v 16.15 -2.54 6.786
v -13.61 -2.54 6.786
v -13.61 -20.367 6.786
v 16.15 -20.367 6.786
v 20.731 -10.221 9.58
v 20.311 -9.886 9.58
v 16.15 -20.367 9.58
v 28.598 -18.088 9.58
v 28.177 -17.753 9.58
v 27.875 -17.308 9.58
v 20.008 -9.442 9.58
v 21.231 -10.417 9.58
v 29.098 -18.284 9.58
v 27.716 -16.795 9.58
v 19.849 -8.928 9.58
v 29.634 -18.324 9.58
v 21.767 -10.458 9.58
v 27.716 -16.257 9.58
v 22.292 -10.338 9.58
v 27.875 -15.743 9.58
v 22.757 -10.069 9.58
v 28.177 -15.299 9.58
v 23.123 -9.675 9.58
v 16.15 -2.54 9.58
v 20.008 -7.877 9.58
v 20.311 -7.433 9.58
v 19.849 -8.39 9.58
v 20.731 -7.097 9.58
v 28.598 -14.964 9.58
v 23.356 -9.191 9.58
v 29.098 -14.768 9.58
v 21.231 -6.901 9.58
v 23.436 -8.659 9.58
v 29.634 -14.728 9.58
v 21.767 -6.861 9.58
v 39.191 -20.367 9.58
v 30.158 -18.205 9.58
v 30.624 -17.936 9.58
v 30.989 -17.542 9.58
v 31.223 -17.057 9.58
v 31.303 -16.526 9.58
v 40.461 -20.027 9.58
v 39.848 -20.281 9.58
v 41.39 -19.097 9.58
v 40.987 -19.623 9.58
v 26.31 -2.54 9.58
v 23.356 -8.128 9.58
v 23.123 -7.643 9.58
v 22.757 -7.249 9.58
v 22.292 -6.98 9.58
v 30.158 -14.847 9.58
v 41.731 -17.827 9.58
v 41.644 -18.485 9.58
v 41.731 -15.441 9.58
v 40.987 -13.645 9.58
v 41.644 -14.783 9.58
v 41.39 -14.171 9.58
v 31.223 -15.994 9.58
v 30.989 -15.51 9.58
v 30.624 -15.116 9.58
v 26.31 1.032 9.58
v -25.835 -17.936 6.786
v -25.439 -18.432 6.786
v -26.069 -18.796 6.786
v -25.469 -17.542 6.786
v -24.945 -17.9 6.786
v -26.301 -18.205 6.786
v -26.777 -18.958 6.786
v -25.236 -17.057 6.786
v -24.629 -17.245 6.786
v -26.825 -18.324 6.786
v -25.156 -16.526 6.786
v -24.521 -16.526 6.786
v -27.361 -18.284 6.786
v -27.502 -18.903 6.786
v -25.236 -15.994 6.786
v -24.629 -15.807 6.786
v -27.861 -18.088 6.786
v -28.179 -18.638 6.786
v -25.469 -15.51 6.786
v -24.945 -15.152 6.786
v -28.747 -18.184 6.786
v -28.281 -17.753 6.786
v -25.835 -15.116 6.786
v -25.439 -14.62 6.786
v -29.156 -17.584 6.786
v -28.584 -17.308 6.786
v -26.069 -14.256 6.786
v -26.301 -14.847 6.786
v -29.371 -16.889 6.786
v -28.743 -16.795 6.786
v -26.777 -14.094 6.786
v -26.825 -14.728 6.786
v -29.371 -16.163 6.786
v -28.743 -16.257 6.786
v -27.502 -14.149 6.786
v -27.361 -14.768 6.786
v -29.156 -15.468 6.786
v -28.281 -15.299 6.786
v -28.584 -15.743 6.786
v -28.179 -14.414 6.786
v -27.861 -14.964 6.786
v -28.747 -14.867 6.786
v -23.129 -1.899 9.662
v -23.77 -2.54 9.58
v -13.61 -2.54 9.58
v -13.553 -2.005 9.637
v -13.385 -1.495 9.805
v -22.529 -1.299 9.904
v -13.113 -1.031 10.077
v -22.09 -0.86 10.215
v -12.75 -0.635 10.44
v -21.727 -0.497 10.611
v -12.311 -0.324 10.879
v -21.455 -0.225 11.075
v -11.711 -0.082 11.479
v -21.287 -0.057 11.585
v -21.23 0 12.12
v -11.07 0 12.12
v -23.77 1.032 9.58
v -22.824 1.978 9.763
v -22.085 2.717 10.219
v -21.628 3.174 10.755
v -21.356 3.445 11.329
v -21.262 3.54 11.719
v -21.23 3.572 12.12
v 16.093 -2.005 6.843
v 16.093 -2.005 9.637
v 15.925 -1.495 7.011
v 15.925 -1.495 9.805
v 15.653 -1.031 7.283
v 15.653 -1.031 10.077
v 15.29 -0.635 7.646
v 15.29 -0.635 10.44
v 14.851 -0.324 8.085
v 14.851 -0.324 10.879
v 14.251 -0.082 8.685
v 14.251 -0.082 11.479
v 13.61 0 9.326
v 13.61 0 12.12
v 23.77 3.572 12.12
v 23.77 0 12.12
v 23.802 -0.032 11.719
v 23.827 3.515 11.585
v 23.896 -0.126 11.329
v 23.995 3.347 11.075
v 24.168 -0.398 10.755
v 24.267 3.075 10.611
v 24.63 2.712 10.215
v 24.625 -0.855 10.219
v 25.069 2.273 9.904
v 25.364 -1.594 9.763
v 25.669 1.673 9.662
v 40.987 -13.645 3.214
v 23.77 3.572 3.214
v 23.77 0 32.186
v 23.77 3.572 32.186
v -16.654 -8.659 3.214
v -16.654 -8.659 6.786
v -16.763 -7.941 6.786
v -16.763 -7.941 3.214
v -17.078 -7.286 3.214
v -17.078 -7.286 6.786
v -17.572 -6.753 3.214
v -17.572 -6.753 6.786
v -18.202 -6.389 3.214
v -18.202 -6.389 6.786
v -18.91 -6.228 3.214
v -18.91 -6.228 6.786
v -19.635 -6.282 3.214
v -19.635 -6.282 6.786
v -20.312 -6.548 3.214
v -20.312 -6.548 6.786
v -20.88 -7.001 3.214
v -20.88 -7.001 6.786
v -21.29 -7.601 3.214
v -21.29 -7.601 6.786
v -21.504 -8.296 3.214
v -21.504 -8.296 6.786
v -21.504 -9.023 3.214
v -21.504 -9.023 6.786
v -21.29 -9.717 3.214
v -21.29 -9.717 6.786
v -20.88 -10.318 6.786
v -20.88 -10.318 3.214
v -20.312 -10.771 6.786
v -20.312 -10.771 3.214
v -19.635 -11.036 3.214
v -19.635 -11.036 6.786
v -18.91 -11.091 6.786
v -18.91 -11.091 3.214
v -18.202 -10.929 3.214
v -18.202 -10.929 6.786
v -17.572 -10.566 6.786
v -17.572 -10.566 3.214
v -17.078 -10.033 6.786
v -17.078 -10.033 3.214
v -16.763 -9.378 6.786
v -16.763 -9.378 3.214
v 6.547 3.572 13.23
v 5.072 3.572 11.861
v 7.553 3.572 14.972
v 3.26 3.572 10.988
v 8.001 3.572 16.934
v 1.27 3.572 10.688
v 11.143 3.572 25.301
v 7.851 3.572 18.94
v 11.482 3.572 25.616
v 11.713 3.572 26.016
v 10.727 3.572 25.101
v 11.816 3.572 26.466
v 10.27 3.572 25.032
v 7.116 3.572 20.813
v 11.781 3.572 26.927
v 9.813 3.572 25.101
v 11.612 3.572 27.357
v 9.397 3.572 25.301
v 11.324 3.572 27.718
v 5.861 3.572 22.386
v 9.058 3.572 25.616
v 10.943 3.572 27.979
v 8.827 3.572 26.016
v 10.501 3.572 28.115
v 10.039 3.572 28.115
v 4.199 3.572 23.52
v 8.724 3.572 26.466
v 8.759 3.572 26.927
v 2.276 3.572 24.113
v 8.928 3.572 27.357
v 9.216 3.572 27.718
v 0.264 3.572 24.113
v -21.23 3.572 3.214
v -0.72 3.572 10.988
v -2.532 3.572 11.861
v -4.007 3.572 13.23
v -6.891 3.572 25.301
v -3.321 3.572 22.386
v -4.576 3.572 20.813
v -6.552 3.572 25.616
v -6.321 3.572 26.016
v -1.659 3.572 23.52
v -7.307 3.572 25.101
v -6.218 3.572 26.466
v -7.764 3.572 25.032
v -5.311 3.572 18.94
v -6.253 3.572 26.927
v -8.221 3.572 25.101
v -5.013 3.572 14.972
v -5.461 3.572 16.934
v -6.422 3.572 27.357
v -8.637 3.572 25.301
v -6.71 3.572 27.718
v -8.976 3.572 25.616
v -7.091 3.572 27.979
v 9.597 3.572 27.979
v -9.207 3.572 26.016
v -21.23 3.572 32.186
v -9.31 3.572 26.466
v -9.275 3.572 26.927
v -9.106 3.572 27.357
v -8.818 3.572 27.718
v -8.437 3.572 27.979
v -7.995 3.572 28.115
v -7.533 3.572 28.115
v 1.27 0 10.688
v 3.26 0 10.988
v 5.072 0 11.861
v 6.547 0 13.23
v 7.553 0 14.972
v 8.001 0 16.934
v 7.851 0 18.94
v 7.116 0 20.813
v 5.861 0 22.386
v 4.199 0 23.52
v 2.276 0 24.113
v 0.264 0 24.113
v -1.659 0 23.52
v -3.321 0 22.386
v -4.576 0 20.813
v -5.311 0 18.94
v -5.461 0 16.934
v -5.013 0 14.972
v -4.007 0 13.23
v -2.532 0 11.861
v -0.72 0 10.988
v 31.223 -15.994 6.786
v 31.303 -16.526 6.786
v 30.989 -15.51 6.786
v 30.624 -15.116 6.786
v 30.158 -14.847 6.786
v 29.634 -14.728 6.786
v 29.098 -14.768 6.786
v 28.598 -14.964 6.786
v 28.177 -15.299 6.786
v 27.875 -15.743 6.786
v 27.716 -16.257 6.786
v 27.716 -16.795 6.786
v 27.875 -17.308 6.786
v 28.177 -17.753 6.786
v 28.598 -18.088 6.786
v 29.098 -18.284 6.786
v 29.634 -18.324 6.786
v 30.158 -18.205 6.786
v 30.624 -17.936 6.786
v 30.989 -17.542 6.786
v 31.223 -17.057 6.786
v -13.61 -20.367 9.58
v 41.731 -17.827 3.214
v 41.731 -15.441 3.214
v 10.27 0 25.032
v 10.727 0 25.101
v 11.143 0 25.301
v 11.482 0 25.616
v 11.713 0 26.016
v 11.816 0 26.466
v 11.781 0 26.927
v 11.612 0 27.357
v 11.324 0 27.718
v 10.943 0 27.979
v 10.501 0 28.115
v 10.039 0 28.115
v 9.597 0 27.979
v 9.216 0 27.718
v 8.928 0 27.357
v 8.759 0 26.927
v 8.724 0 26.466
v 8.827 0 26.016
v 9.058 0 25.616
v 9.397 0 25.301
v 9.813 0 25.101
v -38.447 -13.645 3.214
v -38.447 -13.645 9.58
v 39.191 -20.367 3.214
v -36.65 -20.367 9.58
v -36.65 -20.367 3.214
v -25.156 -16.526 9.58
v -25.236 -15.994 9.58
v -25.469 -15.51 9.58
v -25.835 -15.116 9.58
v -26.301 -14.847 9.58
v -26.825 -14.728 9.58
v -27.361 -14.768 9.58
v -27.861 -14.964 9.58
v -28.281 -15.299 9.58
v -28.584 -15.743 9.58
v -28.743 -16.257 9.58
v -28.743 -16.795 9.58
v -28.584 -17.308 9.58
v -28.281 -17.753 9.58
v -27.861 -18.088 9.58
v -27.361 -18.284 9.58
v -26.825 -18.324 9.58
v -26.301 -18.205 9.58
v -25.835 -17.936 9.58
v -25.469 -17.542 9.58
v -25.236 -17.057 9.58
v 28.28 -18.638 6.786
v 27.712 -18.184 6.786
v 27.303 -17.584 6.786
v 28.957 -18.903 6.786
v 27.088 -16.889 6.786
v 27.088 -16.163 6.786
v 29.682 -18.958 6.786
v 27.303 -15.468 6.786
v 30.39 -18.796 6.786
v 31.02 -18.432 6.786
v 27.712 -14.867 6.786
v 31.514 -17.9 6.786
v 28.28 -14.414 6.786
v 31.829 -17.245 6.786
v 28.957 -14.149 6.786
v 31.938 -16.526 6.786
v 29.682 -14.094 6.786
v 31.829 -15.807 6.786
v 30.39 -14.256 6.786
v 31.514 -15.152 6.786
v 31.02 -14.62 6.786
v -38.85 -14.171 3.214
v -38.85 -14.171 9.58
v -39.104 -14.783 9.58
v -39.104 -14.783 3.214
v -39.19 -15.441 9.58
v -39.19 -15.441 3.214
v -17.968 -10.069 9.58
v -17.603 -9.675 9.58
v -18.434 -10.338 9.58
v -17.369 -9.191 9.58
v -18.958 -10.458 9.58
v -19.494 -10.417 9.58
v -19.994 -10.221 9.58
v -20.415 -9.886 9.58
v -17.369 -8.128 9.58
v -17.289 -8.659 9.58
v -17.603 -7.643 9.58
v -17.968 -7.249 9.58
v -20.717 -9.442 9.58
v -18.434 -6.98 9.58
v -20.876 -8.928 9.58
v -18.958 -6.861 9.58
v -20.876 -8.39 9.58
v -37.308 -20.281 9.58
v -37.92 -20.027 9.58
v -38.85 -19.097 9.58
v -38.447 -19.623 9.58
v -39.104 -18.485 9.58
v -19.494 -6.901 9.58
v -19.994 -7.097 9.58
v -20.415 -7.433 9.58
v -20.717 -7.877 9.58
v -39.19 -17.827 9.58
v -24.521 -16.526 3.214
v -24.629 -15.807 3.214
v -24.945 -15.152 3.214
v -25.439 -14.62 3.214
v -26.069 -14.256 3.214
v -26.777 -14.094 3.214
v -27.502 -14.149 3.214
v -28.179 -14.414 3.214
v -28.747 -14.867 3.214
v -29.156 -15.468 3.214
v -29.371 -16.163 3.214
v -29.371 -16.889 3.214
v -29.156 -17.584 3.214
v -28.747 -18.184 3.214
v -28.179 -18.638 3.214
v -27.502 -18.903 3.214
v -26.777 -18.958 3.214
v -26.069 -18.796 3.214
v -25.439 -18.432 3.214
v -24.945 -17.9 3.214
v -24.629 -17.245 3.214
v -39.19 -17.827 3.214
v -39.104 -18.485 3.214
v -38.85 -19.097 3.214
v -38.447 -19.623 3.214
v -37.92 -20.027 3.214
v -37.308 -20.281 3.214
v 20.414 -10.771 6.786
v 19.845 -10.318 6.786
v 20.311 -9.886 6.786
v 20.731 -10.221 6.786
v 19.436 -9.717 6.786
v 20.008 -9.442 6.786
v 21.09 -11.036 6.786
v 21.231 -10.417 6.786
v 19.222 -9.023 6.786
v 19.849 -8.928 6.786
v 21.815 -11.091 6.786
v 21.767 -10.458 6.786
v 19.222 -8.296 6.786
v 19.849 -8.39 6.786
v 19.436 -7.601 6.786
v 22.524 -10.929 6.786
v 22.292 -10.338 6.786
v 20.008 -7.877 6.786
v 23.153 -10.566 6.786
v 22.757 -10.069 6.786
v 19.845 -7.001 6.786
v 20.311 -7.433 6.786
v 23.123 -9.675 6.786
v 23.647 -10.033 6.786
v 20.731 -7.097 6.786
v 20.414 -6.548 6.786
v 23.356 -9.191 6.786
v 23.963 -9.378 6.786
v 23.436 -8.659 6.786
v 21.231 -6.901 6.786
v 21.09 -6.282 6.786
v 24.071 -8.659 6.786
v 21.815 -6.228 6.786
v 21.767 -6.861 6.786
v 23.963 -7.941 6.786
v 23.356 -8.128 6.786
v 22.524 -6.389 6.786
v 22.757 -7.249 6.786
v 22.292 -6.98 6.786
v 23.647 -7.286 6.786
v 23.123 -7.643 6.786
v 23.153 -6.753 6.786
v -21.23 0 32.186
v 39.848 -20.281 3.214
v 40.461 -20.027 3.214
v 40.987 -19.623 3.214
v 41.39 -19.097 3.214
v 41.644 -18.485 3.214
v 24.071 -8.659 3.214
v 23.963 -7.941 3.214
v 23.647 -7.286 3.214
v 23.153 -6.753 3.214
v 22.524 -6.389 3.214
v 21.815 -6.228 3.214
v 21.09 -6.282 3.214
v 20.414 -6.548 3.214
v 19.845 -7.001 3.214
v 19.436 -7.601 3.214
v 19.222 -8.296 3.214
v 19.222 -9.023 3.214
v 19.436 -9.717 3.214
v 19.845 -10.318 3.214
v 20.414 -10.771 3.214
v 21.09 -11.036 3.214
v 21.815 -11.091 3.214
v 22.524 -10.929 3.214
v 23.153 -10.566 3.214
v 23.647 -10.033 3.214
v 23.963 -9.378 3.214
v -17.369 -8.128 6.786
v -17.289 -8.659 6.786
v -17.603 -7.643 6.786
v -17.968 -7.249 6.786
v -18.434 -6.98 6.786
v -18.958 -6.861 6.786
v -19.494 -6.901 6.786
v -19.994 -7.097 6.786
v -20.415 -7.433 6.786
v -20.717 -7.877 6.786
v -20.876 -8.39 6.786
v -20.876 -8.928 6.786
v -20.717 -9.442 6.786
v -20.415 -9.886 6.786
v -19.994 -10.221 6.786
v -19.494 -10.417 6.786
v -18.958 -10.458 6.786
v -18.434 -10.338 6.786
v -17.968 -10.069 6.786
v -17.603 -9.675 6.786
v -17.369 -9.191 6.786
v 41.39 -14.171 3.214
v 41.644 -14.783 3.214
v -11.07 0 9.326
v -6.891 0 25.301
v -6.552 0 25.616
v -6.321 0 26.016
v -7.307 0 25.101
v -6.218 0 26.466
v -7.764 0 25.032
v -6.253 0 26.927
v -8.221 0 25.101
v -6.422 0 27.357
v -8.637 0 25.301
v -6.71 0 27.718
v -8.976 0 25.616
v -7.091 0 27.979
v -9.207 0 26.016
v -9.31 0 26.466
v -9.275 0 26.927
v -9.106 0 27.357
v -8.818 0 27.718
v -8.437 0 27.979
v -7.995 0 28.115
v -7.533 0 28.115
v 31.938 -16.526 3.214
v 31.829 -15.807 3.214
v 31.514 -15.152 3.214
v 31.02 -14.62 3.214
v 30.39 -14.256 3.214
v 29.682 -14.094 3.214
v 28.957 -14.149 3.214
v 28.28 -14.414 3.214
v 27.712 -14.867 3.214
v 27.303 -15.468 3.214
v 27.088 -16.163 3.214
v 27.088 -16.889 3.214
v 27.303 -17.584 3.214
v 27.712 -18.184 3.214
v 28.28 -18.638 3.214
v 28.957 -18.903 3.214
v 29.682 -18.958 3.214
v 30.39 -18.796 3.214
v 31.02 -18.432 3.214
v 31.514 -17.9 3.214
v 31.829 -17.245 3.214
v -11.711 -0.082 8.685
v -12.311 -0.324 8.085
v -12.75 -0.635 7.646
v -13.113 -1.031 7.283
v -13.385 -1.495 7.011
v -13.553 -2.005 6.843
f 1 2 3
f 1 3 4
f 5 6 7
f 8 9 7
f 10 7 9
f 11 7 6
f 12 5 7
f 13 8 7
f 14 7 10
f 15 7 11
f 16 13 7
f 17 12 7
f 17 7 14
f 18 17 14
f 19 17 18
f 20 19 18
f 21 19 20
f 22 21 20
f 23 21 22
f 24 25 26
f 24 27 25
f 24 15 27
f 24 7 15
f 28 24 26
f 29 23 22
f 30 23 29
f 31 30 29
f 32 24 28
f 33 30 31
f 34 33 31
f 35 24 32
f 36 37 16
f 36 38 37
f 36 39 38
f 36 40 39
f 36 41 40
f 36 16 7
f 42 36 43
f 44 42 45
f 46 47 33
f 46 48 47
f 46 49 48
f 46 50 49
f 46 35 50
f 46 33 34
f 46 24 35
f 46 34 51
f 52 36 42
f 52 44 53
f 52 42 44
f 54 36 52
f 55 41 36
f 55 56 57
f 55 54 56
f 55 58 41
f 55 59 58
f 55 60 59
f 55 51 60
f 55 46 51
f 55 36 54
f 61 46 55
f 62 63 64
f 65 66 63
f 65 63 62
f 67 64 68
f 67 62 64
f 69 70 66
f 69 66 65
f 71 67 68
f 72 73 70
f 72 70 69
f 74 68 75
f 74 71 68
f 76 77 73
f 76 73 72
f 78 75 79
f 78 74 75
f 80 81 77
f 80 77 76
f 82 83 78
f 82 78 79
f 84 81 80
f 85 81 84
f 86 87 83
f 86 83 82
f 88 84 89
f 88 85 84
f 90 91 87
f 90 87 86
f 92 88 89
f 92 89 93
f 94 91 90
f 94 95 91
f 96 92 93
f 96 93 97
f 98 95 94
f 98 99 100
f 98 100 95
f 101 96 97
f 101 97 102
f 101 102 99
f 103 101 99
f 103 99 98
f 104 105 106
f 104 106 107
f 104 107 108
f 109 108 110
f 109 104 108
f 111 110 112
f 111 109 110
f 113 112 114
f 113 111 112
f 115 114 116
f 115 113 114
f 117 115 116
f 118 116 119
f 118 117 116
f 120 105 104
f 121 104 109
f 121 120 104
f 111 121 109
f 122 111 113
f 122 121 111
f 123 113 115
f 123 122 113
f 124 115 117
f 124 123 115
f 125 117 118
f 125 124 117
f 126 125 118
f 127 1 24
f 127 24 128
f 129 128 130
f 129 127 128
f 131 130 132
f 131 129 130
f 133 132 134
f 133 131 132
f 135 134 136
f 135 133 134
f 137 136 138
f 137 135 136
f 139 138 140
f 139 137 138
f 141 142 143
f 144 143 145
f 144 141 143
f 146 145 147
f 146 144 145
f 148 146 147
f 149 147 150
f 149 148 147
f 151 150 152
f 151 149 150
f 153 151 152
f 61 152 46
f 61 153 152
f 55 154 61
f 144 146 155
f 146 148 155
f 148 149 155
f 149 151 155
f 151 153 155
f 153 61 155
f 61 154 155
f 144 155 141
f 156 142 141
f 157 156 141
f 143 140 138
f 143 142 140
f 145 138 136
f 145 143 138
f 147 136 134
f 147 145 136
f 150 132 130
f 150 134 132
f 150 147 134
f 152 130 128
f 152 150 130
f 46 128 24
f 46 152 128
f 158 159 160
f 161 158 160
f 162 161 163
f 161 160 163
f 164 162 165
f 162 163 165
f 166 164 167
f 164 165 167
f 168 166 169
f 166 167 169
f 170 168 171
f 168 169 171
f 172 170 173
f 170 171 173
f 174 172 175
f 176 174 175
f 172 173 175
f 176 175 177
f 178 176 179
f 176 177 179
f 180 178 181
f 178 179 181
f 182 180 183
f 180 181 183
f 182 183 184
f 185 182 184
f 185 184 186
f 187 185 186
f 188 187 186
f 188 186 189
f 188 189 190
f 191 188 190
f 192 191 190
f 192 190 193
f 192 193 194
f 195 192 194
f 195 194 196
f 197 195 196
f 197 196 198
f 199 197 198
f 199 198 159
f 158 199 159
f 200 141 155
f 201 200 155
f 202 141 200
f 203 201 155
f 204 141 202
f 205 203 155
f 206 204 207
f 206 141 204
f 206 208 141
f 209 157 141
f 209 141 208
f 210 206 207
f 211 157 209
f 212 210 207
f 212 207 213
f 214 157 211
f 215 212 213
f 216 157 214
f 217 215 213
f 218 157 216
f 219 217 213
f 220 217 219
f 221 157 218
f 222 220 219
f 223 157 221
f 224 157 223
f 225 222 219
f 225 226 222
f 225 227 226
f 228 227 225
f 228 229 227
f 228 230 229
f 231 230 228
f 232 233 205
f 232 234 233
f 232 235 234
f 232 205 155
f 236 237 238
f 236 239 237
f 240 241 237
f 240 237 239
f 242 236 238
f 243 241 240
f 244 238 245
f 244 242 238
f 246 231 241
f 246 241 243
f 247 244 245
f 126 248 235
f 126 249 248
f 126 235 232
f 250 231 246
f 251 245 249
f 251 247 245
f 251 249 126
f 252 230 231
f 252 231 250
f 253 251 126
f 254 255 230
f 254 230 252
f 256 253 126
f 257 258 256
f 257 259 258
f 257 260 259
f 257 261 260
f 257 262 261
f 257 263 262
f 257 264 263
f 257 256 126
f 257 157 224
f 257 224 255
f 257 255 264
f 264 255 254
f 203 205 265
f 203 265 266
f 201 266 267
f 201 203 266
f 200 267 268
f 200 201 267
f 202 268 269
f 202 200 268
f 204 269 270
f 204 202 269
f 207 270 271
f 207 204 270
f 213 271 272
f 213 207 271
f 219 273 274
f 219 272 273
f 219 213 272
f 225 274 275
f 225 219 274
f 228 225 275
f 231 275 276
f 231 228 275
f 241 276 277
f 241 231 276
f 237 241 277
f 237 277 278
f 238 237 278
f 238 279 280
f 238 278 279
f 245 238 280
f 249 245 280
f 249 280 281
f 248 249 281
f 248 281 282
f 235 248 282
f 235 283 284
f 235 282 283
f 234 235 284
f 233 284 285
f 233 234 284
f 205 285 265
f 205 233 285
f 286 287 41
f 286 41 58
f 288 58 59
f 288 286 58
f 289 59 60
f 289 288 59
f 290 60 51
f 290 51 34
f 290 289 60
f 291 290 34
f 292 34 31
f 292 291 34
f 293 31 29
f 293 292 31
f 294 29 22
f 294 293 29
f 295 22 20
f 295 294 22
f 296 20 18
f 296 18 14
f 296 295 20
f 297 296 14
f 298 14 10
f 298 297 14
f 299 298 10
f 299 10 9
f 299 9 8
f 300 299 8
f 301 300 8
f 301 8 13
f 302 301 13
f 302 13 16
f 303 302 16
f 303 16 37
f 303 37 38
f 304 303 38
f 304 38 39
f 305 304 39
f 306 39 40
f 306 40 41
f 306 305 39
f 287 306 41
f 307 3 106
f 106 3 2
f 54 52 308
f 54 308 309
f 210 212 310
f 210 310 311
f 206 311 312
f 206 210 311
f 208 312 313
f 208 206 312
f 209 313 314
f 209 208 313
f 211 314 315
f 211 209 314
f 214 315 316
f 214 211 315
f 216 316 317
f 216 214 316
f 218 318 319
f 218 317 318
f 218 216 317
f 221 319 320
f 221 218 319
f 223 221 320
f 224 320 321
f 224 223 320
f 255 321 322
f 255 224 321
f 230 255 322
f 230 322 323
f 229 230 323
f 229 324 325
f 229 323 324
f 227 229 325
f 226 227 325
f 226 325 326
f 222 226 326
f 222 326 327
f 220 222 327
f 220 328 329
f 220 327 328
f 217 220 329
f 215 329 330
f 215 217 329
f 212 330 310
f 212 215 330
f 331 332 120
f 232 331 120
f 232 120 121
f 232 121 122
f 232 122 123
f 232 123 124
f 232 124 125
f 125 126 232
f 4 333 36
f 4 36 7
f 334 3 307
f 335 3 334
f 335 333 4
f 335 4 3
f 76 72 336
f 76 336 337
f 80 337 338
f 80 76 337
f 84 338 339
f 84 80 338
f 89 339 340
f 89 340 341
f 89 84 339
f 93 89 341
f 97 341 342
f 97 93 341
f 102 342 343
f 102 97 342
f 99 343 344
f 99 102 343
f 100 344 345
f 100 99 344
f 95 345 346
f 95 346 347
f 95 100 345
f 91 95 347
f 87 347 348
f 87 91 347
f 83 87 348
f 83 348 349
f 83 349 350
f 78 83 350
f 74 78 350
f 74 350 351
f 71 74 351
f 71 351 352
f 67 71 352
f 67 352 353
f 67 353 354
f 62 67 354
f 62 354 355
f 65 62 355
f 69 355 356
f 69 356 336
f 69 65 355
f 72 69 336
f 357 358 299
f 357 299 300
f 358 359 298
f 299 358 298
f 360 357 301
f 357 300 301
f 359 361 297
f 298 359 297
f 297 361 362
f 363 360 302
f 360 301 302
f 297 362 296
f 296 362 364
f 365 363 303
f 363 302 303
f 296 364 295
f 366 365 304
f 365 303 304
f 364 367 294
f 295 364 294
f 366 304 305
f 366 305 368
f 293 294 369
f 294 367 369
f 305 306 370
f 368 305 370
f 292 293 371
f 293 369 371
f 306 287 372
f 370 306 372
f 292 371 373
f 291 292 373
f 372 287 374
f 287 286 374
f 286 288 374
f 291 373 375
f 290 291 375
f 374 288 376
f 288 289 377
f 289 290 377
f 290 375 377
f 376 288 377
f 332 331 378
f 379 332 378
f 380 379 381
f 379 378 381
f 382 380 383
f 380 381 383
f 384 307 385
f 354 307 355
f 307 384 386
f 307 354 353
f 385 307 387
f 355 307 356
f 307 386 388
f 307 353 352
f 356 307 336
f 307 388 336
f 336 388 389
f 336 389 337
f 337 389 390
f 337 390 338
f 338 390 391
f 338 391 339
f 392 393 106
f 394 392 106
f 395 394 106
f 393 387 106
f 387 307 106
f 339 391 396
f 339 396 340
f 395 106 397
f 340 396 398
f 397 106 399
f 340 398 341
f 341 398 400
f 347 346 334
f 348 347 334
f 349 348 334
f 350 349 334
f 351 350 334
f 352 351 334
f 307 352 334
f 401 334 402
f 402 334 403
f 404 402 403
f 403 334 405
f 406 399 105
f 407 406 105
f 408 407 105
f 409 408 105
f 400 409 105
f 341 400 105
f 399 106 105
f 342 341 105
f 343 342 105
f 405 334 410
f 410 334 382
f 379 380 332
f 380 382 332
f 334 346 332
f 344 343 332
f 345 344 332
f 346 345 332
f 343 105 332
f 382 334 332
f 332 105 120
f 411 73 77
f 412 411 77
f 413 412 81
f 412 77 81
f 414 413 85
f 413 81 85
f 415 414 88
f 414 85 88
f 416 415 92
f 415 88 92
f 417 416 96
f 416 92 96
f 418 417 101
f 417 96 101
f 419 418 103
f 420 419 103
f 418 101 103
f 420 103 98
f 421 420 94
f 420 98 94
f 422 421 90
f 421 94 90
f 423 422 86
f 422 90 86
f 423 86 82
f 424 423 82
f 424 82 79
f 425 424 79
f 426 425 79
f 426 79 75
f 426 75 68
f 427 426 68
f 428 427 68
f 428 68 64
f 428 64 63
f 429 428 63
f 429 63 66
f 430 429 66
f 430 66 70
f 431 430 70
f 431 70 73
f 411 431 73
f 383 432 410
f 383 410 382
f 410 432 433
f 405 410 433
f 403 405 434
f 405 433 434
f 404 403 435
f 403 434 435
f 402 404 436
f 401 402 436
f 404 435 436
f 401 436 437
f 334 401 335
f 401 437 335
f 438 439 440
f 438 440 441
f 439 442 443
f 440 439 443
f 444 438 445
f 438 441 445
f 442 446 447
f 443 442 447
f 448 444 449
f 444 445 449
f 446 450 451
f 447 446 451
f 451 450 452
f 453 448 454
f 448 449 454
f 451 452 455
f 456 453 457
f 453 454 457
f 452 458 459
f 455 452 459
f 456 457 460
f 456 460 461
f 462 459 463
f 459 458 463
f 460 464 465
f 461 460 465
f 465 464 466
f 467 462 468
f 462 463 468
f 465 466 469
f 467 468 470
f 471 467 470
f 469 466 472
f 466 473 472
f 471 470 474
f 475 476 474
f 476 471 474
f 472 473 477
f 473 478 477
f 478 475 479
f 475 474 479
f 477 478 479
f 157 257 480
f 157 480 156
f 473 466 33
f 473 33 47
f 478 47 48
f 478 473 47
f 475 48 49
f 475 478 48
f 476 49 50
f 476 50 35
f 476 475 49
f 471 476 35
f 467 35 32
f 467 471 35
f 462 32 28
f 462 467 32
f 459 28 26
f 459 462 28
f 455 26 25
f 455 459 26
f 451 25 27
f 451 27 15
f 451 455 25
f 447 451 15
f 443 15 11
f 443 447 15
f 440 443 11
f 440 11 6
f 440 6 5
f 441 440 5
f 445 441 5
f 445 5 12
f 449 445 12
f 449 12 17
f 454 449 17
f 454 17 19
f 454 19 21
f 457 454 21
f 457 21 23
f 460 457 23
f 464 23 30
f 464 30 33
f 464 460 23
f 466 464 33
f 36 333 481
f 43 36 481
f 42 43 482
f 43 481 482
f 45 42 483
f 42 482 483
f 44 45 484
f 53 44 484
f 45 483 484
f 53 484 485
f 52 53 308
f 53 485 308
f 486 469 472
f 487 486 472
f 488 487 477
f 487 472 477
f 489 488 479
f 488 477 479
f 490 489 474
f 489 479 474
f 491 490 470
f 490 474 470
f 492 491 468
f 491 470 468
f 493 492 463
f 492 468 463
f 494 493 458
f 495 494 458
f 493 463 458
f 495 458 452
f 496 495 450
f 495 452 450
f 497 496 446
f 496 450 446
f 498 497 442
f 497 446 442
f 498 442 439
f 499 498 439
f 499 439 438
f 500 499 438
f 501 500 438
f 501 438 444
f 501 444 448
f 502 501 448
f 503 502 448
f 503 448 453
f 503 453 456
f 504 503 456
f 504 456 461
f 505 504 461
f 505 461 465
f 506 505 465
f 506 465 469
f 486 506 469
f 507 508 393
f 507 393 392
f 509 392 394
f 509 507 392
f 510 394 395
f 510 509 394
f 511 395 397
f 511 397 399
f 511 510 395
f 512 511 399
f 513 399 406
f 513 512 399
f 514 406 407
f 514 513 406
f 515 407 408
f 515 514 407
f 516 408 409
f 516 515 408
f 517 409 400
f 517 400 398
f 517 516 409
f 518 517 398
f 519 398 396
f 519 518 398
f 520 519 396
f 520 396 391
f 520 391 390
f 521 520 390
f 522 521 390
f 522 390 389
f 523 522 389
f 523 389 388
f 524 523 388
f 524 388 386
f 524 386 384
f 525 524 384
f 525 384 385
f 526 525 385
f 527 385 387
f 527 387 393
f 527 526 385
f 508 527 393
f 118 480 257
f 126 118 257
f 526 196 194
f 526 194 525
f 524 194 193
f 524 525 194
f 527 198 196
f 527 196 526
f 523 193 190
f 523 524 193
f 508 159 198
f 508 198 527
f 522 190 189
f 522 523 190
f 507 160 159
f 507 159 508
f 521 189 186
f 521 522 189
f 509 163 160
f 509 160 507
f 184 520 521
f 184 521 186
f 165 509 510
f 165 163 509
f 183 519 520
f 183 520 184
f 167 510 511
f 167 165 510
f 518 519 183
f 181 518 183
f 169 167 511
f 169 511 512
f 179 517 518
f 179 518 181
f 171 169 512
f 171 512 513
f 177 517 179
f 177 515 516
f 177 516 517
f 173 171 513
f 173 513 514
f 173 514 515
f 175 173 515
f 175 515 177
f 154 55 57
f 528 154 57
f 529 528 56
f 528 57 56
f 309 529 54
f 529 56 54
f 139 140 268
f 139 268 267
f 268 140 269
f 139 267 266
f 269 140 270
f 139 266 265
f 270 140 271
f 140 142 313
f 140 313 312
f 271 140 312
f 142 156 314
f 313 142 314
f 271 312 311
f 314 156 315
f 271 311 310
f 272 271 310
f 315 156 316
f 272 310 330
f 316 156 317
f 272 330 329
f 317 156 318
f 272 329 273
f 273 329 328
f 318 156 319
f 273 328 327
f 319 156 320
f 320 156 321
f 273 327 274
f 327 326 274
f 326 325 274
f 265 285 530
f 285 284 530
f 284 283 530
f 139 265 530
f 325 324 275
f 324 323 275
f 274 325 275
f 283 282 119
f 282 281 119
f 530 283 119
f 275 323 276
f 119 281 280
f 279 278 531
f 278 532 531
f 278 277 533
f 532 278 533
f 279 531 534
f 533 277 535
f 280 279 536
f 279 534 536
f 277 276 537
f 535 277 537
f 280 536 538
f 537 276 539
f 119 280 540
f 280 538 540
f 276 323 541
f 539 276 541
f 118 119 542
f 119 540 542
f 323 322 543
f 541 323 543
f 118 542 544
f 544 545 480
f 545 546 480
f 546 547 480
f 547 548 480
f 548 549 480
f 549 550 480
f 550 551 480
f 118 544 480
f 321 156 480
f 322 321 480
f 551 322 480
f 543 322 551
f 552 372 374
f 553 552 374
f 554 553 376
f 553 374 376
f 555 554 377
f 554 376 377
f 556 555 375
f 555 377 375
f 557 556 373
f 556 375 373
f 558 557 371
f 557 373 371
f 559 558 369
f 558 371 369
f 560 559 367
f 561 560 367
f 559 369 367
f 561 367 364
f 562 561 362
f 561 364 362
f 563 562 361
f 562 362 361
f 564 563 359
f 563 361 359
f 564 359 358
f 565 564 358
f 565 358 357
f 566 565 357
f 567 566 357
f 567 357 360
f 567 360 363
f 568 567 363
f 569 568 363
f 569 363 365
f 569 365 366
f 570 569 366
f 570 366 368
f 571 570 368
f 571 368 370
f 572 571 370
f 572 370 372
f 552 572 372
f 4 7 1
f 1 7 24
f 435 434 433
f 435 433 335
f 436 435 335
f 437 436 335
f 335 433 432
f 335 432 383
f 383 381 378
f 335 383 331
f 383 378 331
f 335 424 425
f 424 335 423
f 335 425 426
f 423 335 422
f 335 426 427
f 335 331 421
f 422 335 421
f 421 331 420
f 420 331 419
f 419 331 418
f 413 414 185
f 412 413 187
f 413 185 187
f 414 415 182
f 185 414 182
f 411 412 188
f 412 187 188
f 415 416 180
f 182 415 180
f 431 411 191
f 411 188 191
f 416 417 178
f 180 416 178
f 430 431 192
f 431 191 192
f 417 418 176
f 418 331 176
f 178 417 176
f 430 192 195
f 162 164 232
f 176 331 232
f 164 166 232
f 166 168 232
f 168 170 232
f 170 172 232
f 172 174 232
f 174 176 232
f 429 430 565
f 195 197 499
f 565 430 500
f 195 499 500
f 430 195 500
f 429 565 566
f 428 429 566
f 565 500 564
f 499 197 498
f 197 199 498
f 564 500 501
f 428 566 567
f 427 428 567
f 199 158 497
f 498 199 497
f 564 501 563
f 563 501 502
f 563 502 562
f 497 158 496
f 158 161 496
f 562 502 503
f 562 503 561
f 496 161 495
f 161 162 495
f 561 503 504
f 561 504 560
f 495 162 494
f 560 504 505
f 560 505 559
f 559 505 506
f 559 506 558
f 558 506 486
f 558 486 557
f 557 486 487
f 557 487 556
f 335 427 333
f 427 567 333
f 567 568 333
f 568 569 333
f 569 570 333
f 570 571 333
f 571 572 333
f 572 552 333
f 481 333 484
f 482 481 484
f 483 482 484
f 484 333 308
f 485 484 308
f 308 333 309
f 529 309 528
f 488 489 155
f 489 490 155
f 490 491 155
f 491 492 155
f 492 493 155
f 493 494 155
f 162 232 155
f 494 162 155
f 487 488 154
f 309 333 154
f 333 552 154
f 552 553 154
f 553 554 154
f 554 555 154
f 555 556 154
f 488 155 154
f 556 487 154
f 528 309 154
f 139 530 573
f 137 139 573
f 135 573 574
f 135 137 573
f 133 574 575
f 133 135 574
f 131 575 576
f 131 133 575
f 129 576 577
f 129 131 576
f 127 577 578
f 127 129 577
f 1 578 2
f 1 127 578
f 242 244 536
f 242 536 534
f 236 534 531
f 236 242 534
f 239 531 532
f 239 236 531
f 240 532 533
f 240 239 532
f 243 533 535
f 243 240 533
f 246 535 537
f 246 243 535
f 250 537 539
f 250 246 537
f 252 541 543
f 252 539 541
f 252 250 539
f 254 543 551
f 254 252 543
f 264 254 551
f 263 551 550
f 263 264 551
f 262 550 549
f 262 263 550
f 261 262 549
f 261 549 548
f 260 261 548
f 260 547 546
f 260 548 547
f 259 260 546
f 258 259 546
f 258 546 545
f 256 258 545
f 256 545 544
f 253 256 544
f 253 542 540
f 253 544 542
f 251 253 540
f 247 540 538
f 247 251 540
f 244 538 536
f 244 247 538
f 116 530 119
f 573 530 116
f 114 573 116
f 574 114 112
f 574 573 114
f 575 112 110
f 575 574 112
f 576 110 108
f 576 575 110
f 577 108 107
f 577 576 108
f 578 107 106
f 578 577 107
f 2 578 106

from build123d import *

# Parameters (mm, degrees)
BOSS_EXTRUDE1_DEPTH      = 1.7859375
BOSS_EXTRUDE1_DEPTH_BACK = 1.7859375
SKETCH2_W                = 45
SKETCH2_H                = 3.571875
BOSS_EXTRUDE2_DEPTH      = 25.4
FILLET1_R                = 2
SKETCH9_W                = 44.9012818
SKETCH9_H                = 1.417156311
CUT_EXTRUDE1_DEPTH       = 10
BOSS_EXTRUDE3_DEPTH      = 3.571875
SKETCH14_R               = 2.4384
CUT_EXTRUDE4_DEPTH       = 53.928506192
CUT_EXTRUDE5_DEPTH       = 57.499569383
CUT_EXTRUDE5_DEPTH_BACK  = 57.499569383
SKETCH15_R               = 6.75
SKETCH15_R_2             = 1.55
SKETCH19_R               = 1.8034
BOSS_EXTRUDE6_DEPTH      = 2.794
FILLET3_R                = 2.54


with BuildPart() as part:
    # Sketch1 → Boss-Extrude1 (new, two sides: drawn at the far end of the back side and taken through both)
    with BuildSketch(Plane.XY.offset(5).offset(-BOSS_EXTRUDE1_DEPTH_BACK)):
        with BuildLine():
            Line((-21.183407813, 0), (-21.183407813, -8.813455393))
            ThreePointArc((-21.183407813, -8.813455393), (-22.866221682, -12.686440931), (-19.530849883, -15.276262248))
            Line((-19.530849883, -15.276262248), (24.68248716, -15.276262248))
            ThreePointArc((24.68248716, -15.276262248), (25.214329472, -14.744419936), (24.68248716, -14.212577623))
            Line((24.68248716, -14.212577623), (23.717873987, 0))
            Line((23.717873987, 0), (23.717873987, 4.989031311))
            Line((23.717873987, 4.989031311), (-21.183407813, 4.989031311))
            Line((-21.183407813, 4.989031311), (-21.183407813, 0))
        make_face()
    extrude(amount=BOSS_EXTRUDE1_DEPTH + BOSS_EXTRUDE1_DEPTH_BACK)

    # Sketch2 → Boss-Extrude2 (add)
    with BuildSketch(Plane.XY.offset(6.7859375)):
        with Locations((1.270019176, 1.7859375)):
            Rectangle(SKETCH2_W, SKETCH2_H)
    extrude(amount=BOSS_EXTRUDE2_DEPTH)

    # Fillet1
    fillet1_edges = [part.edges().sort_by_distance(p)[0] for p in [
        (1.267233087, 4.989031311, 3.2140625),
    ]]
    fillet(fillet1_edges, radius=FILLET1_R)

    # Sketch9 → Cut-Extrude1 (cut)
    with BuildSketch(Plane.XY.offset(6.7859375)):
        with Locations((1.267233087, 4.280453156)):
            Rectangle(SKETCH9_W, SKETCH9_H)
    extrude(amount=-CUT_EXTRUDE1_DEPTH, mode=Mode.SUBTRACT)

    # Sketch13 → Boss-Extrude3 (add, through all)
    with BuildSketch(Plane.XY.offset(6.7859375)):
        Polygon((-21.229980824, 3.571875), (-39.190493066, -14.388637242), (-39.190493066, -20.367363974), (41.730531418, -20.367363974), (41.730531418, -14.388637242), (23.770019176, 3.571875), align=None)
    extrude(amount=-BOSS_EXTRUDE3_DEPTH)

    # Sketch14 → Cut-Extrude4 (cut, through all)
    with BuildSketch(Plane.XY.offset(6.7859375)):
        with Locations((-26.959384229, -16.525938199)):
            Circle(SKETCH14_R)
        with Locations((-19.092679867, -8.659233837)):
            Circle(SKETCH14_R)
        with Locations((21.632718219, -8.659233837)):
            Circle(SKETCH14_R)
        with Locations((29.499422581, -16.525938199)):
            Circle(SKETCH14_R)
    extrude(amount=-CUT_EXTRUDE4_DEPTH, mode=Mode.SUBTRACT)

    # Sketch15 → Cut-Extrude5 (cut, two sides: drawn at the far end of the back side and taken through both)
    with BuildSketch(Plane.XZ.offset(-CUT_EXTRUDE5_DEPTH_BACK)):
        with Locations(Location((1.270019176, 17.4380625, 0), (0, 0, 270))):
            Circle(SKETCH15_R)
        with Locations(Location((-7.763980824, 26.5820625, 0), (0, 0, 270))):
            Circle(SKETCH15_R_2)
        with Locations(Location((10.270019176, 26.5820625, 0), (0, 0, 270))):
            Circle(SKETCH15_R_2)
    extrude(amount=CUT_EXTRUDE5_DEPTH + CUT_EXTRUDE5_DEPTH_BACK, mode=Mode.SUBTRACT)

    # Sketch19 → Boss-Extrude6 (add)
    # profile 1 of 2: a face of its own
    with BuildSketch(Plane.XY.offset(6.7859375)):
        Polygon((-39.190493066, -14.388637242), (-21.229980824, 3.571875), (-21.229980824, 0), (-13.609980824, 0), (-13.609980824, -20.367363974), (-39.190493066, -20.367363974), align=None)
        with Locations((-19.092679867, -8.659233837)):
            Circle(SKETCH19_R, mode=Mode.SUBTRACT)
        with Locations((-26.959384229, -16.525938199)):
            Circle(SKETCH19_R, mode=Mode.SUBTRACT)
    # profile 2 of 2: a face of its own
    with BuildSketch(Plane.XY.offset(6.7859375)):
        Polygon((41.730531418, -20.367363974), (41.730531418, -14.388637242), (23.770019176, 3.571875), (23.770019176, 0), (16.150019176, 0), (16.150019176, -20.367363974), align=None)
        with Locations((21.632718219, -8.659233837)):
            Circle(SKETCH19_R, mode=Mode.SUBTRACT)
        with Locations((29.499422581, -16.525938199)):
            Circle(SKETCH19_R, mode=Mode.SUBTRACT)
    extrude(amount=BOSS_EXTRUDE6_DEPTH)

    # Fillet3
    # the kernel refuses this fillet: 2.54 mm, written as the material it adds along each edge
    with BuildSketch(Plane(origin=(16.150019176, 0, 6.7859375), x_dir=(0, -1, 0), z_dir=(-1, 0, 0))) as fillet3_piece_1:
        with BuildLine():
            CenterArc((FILLET3_R, FILLET3_R), FILLET3_R, 180, 90)
            Line((0, FILLET3_R), (-FILLET3_R * 0.02, FILLET3_R))
            Line((-FILLET3_R * 0.02, FILLET3_R), (-FILLET3_R * 0.02, -FILLET3_R * 0.02))
            Line((-FILLET3_R * 0.02, -FILLET3_R * 0.02), (FILLET3_R, -FILLET3_R * 0.02))
            Line((FILLET3_R, -FILLET3_R * 0.02), (FILLET3_R, 0))
        make_face()
    extrude(amount=29.76)
    with BuildSketch(Plane(origin=(-21.229980824, 0, 9.5799375), x_dir=(0, -1, 0), z_dir=(1, 0, 0))) as fillet3_piece_2:
        with BuildLine():
            CenterArc((FILLET3_R, -FILLET3_R), FILLET3_R, 90, 90)
            Line((0, -FILLET3_R), (-FILLET3_R * 0.02, -FILLET3_R))
            Line((-FILLET3_R * 0.02, -FILLET3_R), (-FILLET3_R * 0.02, FILLET3_R * 0.02))
            Line((-FILLET3_R * 0.02, FILLET3_R * 0.02), (FILLET3_R, FILLET3_R * 0.02))
            Line((FILLET3_R, FILLET3_R * 0.02), (FILLET3_R, 0))
        make_face()
    extrude(amount=7.62)
    with BuildSketch(Plane(origin=(-21.229980824, 3.571875, 9.5799375), x_dir=(-1, 0, 0), z_dir=(0, -1, 0))) as fillet3_piece_3_section:
        with BuildLine():
            CenterArc((FILLET3_R, -FILLET3_R), FILLET3_R, 90, 90)
            Line((0, -FILLET3_R), (-FILLET3_R * 0.02, -FILLET3_R))
            Line((-FILLET3_R * 0.02, -FILLET3_R), (-FILLET3_R * 0.02, FILLET3_R * 0.02))
            Line((-FILLET3_R * 0.02, FILLET3_R * 0.02), (FILLET3_R, FILLET3_R * 0.02))
            Line((FILLET3_R, FILLET3_R * 0.02), (FILLET3_R, 0))
        make_face()
    fillet3_piece_3 = extrude(amount=3.571875, mode=Mode.PRIVATE)
    fillet3_piece_3 = split(fillet3_piece_3, bisect_by=Plane(origin=(-22.480055671, 2.321800154, 10.2136759), z_dir=(0.7071067811865489, -0.7071067811865461, 0)), keep=Keep.TOP, mode=Mode.PRIVATE)
    add(fillet3_piece_3)
    with BuildSketch(Plane(origin=(-13.609980824, 0, 6.7859375), x_dir=(0, -1, 0), z_dir=(0, 0, 1))) as fillet3_piece_4:
        with BuildLine():
            CenterArc((FILLET3_R, FILLET3_R), FILLET3_R, 180, 90)
            Line((0, FILLET3_R), (-FILLET3_R * 0.02, FILLET3_R))
            Line((-FILLET3_R * 0.02, FILLET3_R), (-FILLET3_R * 0.02, -FILLET3_R * 0.02))
            Line((-FILLET3_R * 0.02, -FILLET3_R * 0.02), (FILLET3_R, -FILLET3_R * 0.02))
            Line((FILLET3_R, -FILLET3_R * 0.02), (FILLET3_R, 0))
        make_face()
    extrude(amount=2.794)
    with BuildSketch(Plane(origin=(23.770019176, 3.571875, 9.5799375), x_dir=(1, 0, 0), z_dir=(0, -1, 0))) as fillet3_piece_5_section:
        with BuildLine():
            CenterArc((FILLET3_R, FILLET3_R), FILLET3_R, 180, 90)
            Line((0, FILLET3_R), (-FILLET3_R * 0.02, FILLET3_R))
            Line((-FILLET3_R * 0.02, FILLET3_R), (-FILLET3_R * 0.02, -FILLET3_R * 0.02))
            Line((-FILLET3_R * 0.02, -FILLET3_R * 0.02), (FILLET3_R, -FILLET3_R * 0.02))
            Line((FILLET3_R, -FILLET3_R * 0.02), (FILLET3_R, 0))
        make_face()
    fillet3_piece_5 = extrude(amount=3.571875, mode=Mode.PRIVATE)
    fillet3_piece_5 = split(fillet3_piece_5, bisect_by=Plane(origin=(25.020094022, 2.321800154, 10.2136759), z_dir=(-0.7071067811865436, -0.7071067811865516, 0)), keep=Keep.TOP, mode=Mode.PRIVATE)
    add(fillet3_piece_5)
    with BuildSketch(Plane(origin=(23.770019176, 0, 9.5799375), x_dir=(0, -1, 0), z_dir=(-1, 0, 0))) as fillet3_piece_6:
        with BuildLine():
            CenterArc((FILLET3_R, FILLET3_R), FILLET3_R, 180, 90)
            Line((0, FILLET3_R), (-FILLET3_R * 0.02, FILLET3_R))
            Line((-FILLET3_R * 0.02, FILLET3_R), (-FILLET3_R * 0.02, -FILLET3_R * 0.02))
            Line((-FILLET3_R * 0.02, -FILLET3_R * 0.02), (FILLET3_R, -FILLET3_R * 0.02))
            Line((FILLET3_R, -FILLET3_R * 0.02), (FILLET3_R, 0))
        make_face()
    extrude(amount=7.62)
    with BuildSketch(Plane(origin=(16.150019176, 0, 6.7859375), x_dir=(0, -1, 0), z_dir=(0, 0, 1))) as fillet3_piece_7:
        with BuildLine():
            CenterArc((FILLET3_R, -FILLET3_R), FILLET3_R, 90, 90)
            Line((0, -FILLET3_R), (-FILLET3_R * 0.02, -FILLET3_R))
            Line((-FILLET3_R * 0.02, -FILLET3_R), (-FILLET3_R * 0.02, FILLET3_R * 0.02))
            Line((-FILLET3_R * 0.02, FILLET3_R * 0.02), (FILLET3_R, FILLET3_R * 0.02))
            Line((FILLET3_R, FILLET3_R * 0.02), (FILLET3_R, 0))
        make_face()
    extrude(amount=2.794)
    with BuildSketch(Plane(origin=(16.150019176, 0, 0.4359375), x_dir=(0, -1, 0), z_dir=(0, 0, 1))) as fillet3_piece_8a_section:
        with BuildLine():
            CenterArc((FILLET3_R, -FILLET3_R), FILLET3_R, 90, 90)
            Line((0, -FILLET3_R), (-FILLET3_R * 0.02, -FILLET3_R))
            Line((-FILLET3_R * 0.02, -FILLET3_R), (-FILLET3_R * 0.02, FILLET3_R * 0.02))
            Line((-FILLET3_R * 0.02, FILLET3_R * 0.02), (FILLET3_R, FILLET3_R * 0.02))
            Line((FILLET3_R, FILLET3_R * 0.02), (FILLET3_R, 0))
        make_face()
    fillet3_piece_8a = extrude(amount=9.144, mode=Mode.PRIVATE)
    fillet3_piece_8a = split(fillet3_piece_8a, bisect_by=Plane(origin=(15.574975586, -0.57504359, 6.7859375), z_dir=(0, 0, -1)), keep=Keep.TOP, mode=Mode.PRIVATE)
    with BuildSketch(Plane(origin=(22.500019176, 0, 6.7859375), x_dir=(0, -1, 0), z_dir=(-1, 0, 0))) as fillet3_piece_8b_section:
        with BuildLine():
            CenterArc((FILLET3_R, FILLET3_R), FILLET3_R, 180, 90)
            Line((0, FILLET3_R), (-FILLET3_R * 0.02, FILLET3_R))
            Line((-FILLET3_R * 0.02, FILLET3_R), (-FILLET3_R * 0.02, -FILLET3_R * 0.02))
            Line((-FILLET3_R * 0.02, -FILLET3_R * 0.02), (FILLET3_R, -FILLET3_R * 0.02))
            Line((FILLET3_R, -FILLET3_R * 0.02), (FILLET3_R, 0))
        make_face()
    fillet3_piece_8b = extrude(amount=36.11, mode=Mode.PRIVATE)
    fillet3_piece_8b = split(fillet3_piece_8b, bisect_by=Plane(origin=(16.150019176, -0.57504359, 7.36098109), z_dir=(1, 0, 0)), keep=Keep.TOP, mode=Mode.PRIVATE)
    fillet3_piece_8 = fillet3_piece_8a & fillet3_piece_8b
    add(fillet3_piece_8)
    with BuildSketch(Plane(origin=(16.150019176, 0, 6.7859375), x_dir=(0, -1, 0), z_dir=(-1, 0, 0))) as fillet3_piece_9a_section:
        with BuildLine():
            CenterArc((FILLET3_R, FILLET3_R), FILLET3_R, 180, 90)
            Line((0, FILLET3_R), (-FILLET3_R * 0.02, FILLET3_R))
            Line((-FILLET3_R * 0.02, FILLET3_R), (-FILLET3_R * 0.02, -FILLET3_R * 0.02))
            Line((-FILLET3_R * 0.02, -FILLET3_R * 0.02), (FILLET3_R, -FILLET3_R * 0.02))
            Line((FILLET3_R, -FILLET3_R * 0.02), (FILLET3_R, 0))
        make_face()
    fillet3_piece_9a = extrude(amount=36.11, mode=Mode.PRIVATE)
    fillet3_piece_9a = split(fillet3_piece_9a, bisect_by=Plane(origin=(-13.609980824, -0.57504359, 7.36098109), z_dir=(-1, 0, 0)), keep=Keep.TOP, mode=Mode.PRIVATE)
    with BuildSketch(Plane(origin=(-13.609980824, 0, 0.4359375), x_dir=(0, -1, 0), z_dir=(0, 0, 1))) as fillet3_piece_9b_section:
        with BuildLine():
            CenterArc((FILLET3_R, FILLET3_R), FILLET3_R, 180, 90)
            Line((0, FILLET3_R), (-FILLET3_R * 0.02, FILLET3_R))
            Line((-FILLET3_R * 0.02, FILLET3_R), (-FILLET3_R * 0.02, -FILLET3_R * 0.02))
            Line((-FILLET3_R * 0.02, -FILLET3_R * 0.02), (FILLET3_R, -FILLET3_R * 0.02))
            Line((FILLET3_R, -FILLET3_R * 0.02), (FILLET3_R, 0))
        make_face()
    fillet3_piece_9b = extrude(amount=9.144, mode=Mode.PRIVATE)
    fillet3_piece_9b = split(fillet3_piece_9b, bisect_by=Plane(origin=(-13.034937234, -0.57504359, 6.7859375), z_dir=(0, 0, -1)), keep=Keep.TOP, mode=Mode.PRIVATE)
    fillet3_piece_9 = fillet3_piece_9a & fillet3_piece_9b
    add(fillet3_piece_9)
    with BuildSketch(Plane(origin=(-21.229980824, 3.571875, 9.5799375), x_dir=(-1, 0, 0), z_dir=(0, -1, 0))) as fillet3_piece_10a_section:
        with BuildLine():
            CenterArc((FILLET3_R, -FILLET3_R), FILLET3_R, 90, 90)
            Line((0, -FILLET3_R), (-FILLET3_R * 0.02, -FILLET3_R))
            Line((-FILLET3_R * 0.02, -FILLET3_R), (-FILLET3_R * 0.02, FILLET3_R * 0.02))
            Line((-FILLET3_R * 0.02, FILLET3_R * 0.02), (FILLET3_R, FILLET3_R * 0.02))
            Line((FILLET3_R, FILLET3_R * 0.02), (FILLET3_R, 0))
        make_face()
    fillet3_piece_10a = extrude(amount=9.921875, mode=Mode.PRIVATE)
    fillet3_piece_10a = split(fillet3_piece_10a, bisect_by=Plane(origin=(-21.805024414, 0, 10.15498109), z_dir=(0, -1, 0)), keep=Keep.TOP, mode=Mode.PRIVATE)
    with BuildSketch(Plane(origin=(-27.579980824, 0, 9.5799375), x_dir=(0, -1, 0), z_dir=(1, 0, 0))) as fillet3_piece_10b_section:
        with BuildLine():
            CenterArc((FILLET3_R, -FILLET3_R), FILLET3_R, 90, 90)
            Line((0, -FILLET3_R), (-FILLET3_R * 0.02, -FILLET3_R))
            Line((-FILLET3_R * 0.02, -FILLET3_R), (-FILLET3_R * 0.02, FILLET3_R * 0.02))
            Line((-FILLET3_R * 0.02, FILLET3_R * 0.02), (FILLET3_R, FILLET3_R * 0.02))
            Line((FILLET3_R, FILLET3_R * 0.02), (FILLET3_R, 0))
        make_face()
    fillet3_piece_10b = extrude(amount=13.97, mode=Mode.PRIVATE)
    fillet3_piece_10b = split(fillet3_piece_10b, bisect_by=Plane(origin=(-21.229980824, -0.57504359, 10.15498109), z_dir=(-1, 0, 0)), keep=Keep.TOP, mode=Mode.PRIVATE)
    fillet3_piece_10 = fillet3_piece_10a & fillet3_piece_10b
    add(fillet3_piece_10)
    with BuildSketch(Plane(origin=(-13.609980824, 0, 6.7859375), x_dir=(0, -1, 0), z_dir=(0, 0, 1))) as fillet3_piece_11a_section:
        with BuildLine():
            CenterArc((FILLET3_R, FILLET3_R), FILLET3_R, 180, 90)
            Line((0, FILLET3_R), (-FILLET3_R * 0.02, FILLET3_R))
            Line((-FILLET3_R * 0.02, FILLET3_R), (-FILLET3_R * 0.02, -FILLET3_R * 0.02))
            Line((-FILLET3_R * 0.02, -FILLET3_R * 0.02), (FILLET3_R, -FILLET3_R * 0.02))
            Line((FILLET3_R, -FILLET3_R * 0.02), (FILLET3_R, 0))
        make_face()
    fillet3_piece_11a = extrude(amount=9.144, mode=Mode.PRIVATE)
    fillet3_piece_11a = split(fillet3_piece_11a, bisect_by=Plane(origin=(-13.034937234, -0.57504359, 9.5799375), z_dir=(0, 0, 1)), keep=Keep.TOP, mode=Mode.PRIVATE)
    with BuildSketch(Plane(origin=(-21.229980824, 0, 9.5799375), x_dir=(0, -1, 0), z_dir=(1, 0, 0))) as fillet3_piece_11b_section:
        with BuildLine():
            CenterArc((FILLET3_R, -FILLET3_R), FILLET3_R, 90, 90)
            Line((0, -FILLET3_R), (-FILLET3_R * 0.02, -FILLET3_R))
            Line((-FILLET3_R * 0.02, -FILLET3_R), (-FILLET3_R * 0.02, FILLET3_R * 0.02))
            Line((-FILLET3_R * 0.02, FILLET3_R * 0.02), (FILLET3_R, FILLET3_R * 0.02))
            Line((FILLET3_R, FILLET3_R * 0.02), (FILLET3_R, 0))
        make_face()
    fillet3_piece_11b = extrude(amount=13.97, mode=Mode.PRIVATE)
    fillet3_piece_11b = split(fillet3_piece_11b, bisect_by=Plane(origin=(-13.609980824, -0.57504359, 10.15498109), z_dir=(1, 0, 0)), keep=Keep.TOP, mode=Mode.PRIVATE)
    fillet3_piece_11 = fillet3_piece_11a & fillet3_piece_11b
    add(fillet3_piece_11)
    with BuildSketch(Plane(origin=(23.770019176, 3.571875, 9.5799375), x_dir=(1, 0, 0), z_dir=(0, -1, 0))) as fillet3_piece_12a_section:
        with BuildLine():
            CenterArc((FILLET3_R, FILLET3_R), FILLET3_R, 180, 90)
            Line((0, FILLET3_R), (-FILLET3_R * 0.02, FILLET3_R))
            Line((-FILLET3_R * 0.02, FILLET3_R), (-FILLET3_R * 0.02, -FILLET3_R * 0.02))
            Line((-FILLET3_R * 0.02, -FILLET3_R * 0.02), (FILLET3_R, -FILLET3_R * 0.02))
            Line((FILLET3_R, -FILLET3_R * 0.02), (FILLET3_R, 0))
        make_face()
    fillet3_piece_12a = extrude(amount=9.921875, mode=Mode.PRIVATE)
    fillet3_piece_12a = split(fillet3_piece_12a, bisect_by=Plane(origin=(24.345062766, 0, 10.15498109), z_dir=(0, -1, 0)), keep=Keep.TOP, mode=Mode.PRIVATE)
    with BuildSketch(Plane(origin=(30.120019176, 0, 9.5799375), x_dir=(0, -1, 0), z_dir=(-1, 0, 0))) as fillet3_piece_12b_section:
        with BuildLine():
            CenterArc((FILLET3_R, FILLET3_R), FILLET3_R, 180, 90)
            Line((0, FILLET3_R), (-FILLET3_R * 0.02, FILLET3_R))
            Line((-FILLET3_R * 0.02, FILLET3_R), (-FILLET3_R * 0.02, -FILLET3_R * 0.02))
            Line((-FILLET3_R * 0.02, -FILLET3_R * 0.02), (FILLET3_R, -FILLET3_R * 0.02))
            Line((FILLET3_R, -FILLET3_R * 0.02), (FILLET3_R, 0))
        make_face()
    fillet3_piece_12b = extrude(amount=13.97, mode=Mode.PRIVATE)
    fillet3_piece_12b = split(fillet3_piece_12b, bisect_by=Plane(origin=(23.770019176, -0.57504359, 10.15498109), z_dir=(1, 0, 0)), keep=Keep.TOP, mode=Mode.PRIVATE)
    fillet3_piece_12 = fillet3_piece_12a & fillet3_piece_12b
    add(fillet3_piece_12)
    with BuildSketch(Plane(origin=(23.770019176, 0, 9.5799375), x_dir=(0, -1, 0), z_dir=(-1, 0, 0))) as fillet3_piece_13a_section:
        with BuildLine():
            CenterArc((FILLET3_R, FILLET3_R), FILLET3_R, 180, 90)
            Line((0, FILLET3_R), (-FILLET3_R * 0.02, FILLET3_R))
            Line((-FILLET3_R * 0.02, FILLET3_R), (-FILLET3_R * 0.02, -FILLET3_R * 0.02))
            Line((-FILLET3_R * 0.02, -FILLET3_R * 0.02), (FILLET3_R, -FILLET3_R * 0.02))
            Line((FILLET3_R, -FILLET3_R * 0.02), (FILLET3_R, 0))
        make_face()
    fillet3_piece_13a = extrude(amount=13.97, mode=Mode.PRIVATE)
    fillet3_piece_13a = split(fillet3_piece_13a, bisect_by=Plane(origin=(16.150019176, -0.57504359, 10.15498109), z_dir=(-1, 0, 0)), keep=Keep.TOP, mode=Mode.PRIVATE)
    with BuildSketch(Plane(origin=(16.150019176, 0, 6.7859375), x_dir=(0, -1, 0), z_dir=(0, 0, 1))) as fillet3_piece_13b_section:
        with BuildLine():
            CenterArc((FILLET3_R, -FILLET3_R), FILLET3_R, 90, 90)
            Line((0, -FILLET3_R), (-FILLET3_R * 0.02, -FILLET3_R))
            Line((-FILLET3_R * 0.02, -FILLET3_R), (-FILLET3_R * 0.02, FILLET3_R * 0.02))
            Line((-FILLET3_R * 0.02, FILLET3_R * 0.02), (FILLET3_R, FILLET3_R * 0.02))
            Line((FILLET3_R, FILLET3_R * 0.02), (FILLET3_R, 0))
        make_face()
    fillet3_piece_13b = extrude(amount=9.144, mode=Mode.PRIVATE)
    fillet3_piece_13b = split(fillet3_piece_13b, bisect_by=Plane(origin=(15.574975586, -0.57504359, 9.5799375), z_dir=(0, 0, 1)), keep=Keep.TOP, mode=Mode.PRIVATE)
    fillet3_piece_13 = fillet3_piece_13a & fillet3_piece_13b
    add(fillet3_piece_13)
    # the kernel refuses this fillet: 2.54 mm, written as the material it takes off along each edge
    with BuildSketch(Plane(origin=(41.730531418, -20.367363974, 3.2140625), x_dir=(0, 1, 0), z_dir=(0, 0, 1)), Plane(origin=(-39.190493066, -20.367363974, 3.2140625), x_dir=(1, 0, 0), z_dir=(0, 0, 1))) as fillet3_2_piece_1:
        with BuildLine():
            CenterArc((FILLET3_R, FILLET3_R), FILLET3_R, 180, 90)
            Line((0, FILLET3_R), (-FILLET3_R * 0.02, FILLET3_R))
            Line((-FILLET3_R * 0.02, FILLET3_R), (-FILLET3_R * 0.02, -FILLET3_R * 0.02))
            Line((-FILLET3_R * 0.02, -FILLET3_R * 0.02), (FILLET3_R, -FILLET3_R * 0.02))
            Line((FILLET3_R, -FILLET3_R * 0.02), (FILLET3_R, 0))
        make_face()
    extrude(amount=6.365875, mode=Mode.SUBTRACT)
    with BuildSketch(Plane(origin=(-39.190493066, -14.388637242, 3.2140625), x_dir=(0, -1, 0), z_dir=(0, 0, 1)), Plane(origin=(41.730531418, -14.388637242, 9.5799375), x_dir=(0, -1, 0), z_dir=(0, 0, -1))) as fillet3_2_piece_2:
        with BuildLine():
            CenterArc((FILLET3_R * 0.414213562373, FILLET3_R), FILLET3_R, 225, 45)
            Line((-FILLET3_R * 0.292893218813, FILLET3_R * 0.292893218813), (-FILLET3_R * 0.307035354437, FILLET3_R * 0.27875108319))
            Line((-FILLET3_R * 0.307035354437, FILLET3_R * 0.27875108319), (-FILLET3_R * 0.00828427124746, -FILLET3_R * 0.02))
            Line((-FILLET3_R * 0.00828427124746, -FILLET3_R * 0.02), (FILLET3_R * 0.414213562373, -FILLET3_R * 0.02))
            Line((FILLET3_R * 0.414213562373, -FILLET3_R * 0.02), (FILLET3_R * 0.414213562373, 0))
        make_face()
    extrude(amount=6.365875, mode=Mode.SUBTRACT)


solid = part.part
